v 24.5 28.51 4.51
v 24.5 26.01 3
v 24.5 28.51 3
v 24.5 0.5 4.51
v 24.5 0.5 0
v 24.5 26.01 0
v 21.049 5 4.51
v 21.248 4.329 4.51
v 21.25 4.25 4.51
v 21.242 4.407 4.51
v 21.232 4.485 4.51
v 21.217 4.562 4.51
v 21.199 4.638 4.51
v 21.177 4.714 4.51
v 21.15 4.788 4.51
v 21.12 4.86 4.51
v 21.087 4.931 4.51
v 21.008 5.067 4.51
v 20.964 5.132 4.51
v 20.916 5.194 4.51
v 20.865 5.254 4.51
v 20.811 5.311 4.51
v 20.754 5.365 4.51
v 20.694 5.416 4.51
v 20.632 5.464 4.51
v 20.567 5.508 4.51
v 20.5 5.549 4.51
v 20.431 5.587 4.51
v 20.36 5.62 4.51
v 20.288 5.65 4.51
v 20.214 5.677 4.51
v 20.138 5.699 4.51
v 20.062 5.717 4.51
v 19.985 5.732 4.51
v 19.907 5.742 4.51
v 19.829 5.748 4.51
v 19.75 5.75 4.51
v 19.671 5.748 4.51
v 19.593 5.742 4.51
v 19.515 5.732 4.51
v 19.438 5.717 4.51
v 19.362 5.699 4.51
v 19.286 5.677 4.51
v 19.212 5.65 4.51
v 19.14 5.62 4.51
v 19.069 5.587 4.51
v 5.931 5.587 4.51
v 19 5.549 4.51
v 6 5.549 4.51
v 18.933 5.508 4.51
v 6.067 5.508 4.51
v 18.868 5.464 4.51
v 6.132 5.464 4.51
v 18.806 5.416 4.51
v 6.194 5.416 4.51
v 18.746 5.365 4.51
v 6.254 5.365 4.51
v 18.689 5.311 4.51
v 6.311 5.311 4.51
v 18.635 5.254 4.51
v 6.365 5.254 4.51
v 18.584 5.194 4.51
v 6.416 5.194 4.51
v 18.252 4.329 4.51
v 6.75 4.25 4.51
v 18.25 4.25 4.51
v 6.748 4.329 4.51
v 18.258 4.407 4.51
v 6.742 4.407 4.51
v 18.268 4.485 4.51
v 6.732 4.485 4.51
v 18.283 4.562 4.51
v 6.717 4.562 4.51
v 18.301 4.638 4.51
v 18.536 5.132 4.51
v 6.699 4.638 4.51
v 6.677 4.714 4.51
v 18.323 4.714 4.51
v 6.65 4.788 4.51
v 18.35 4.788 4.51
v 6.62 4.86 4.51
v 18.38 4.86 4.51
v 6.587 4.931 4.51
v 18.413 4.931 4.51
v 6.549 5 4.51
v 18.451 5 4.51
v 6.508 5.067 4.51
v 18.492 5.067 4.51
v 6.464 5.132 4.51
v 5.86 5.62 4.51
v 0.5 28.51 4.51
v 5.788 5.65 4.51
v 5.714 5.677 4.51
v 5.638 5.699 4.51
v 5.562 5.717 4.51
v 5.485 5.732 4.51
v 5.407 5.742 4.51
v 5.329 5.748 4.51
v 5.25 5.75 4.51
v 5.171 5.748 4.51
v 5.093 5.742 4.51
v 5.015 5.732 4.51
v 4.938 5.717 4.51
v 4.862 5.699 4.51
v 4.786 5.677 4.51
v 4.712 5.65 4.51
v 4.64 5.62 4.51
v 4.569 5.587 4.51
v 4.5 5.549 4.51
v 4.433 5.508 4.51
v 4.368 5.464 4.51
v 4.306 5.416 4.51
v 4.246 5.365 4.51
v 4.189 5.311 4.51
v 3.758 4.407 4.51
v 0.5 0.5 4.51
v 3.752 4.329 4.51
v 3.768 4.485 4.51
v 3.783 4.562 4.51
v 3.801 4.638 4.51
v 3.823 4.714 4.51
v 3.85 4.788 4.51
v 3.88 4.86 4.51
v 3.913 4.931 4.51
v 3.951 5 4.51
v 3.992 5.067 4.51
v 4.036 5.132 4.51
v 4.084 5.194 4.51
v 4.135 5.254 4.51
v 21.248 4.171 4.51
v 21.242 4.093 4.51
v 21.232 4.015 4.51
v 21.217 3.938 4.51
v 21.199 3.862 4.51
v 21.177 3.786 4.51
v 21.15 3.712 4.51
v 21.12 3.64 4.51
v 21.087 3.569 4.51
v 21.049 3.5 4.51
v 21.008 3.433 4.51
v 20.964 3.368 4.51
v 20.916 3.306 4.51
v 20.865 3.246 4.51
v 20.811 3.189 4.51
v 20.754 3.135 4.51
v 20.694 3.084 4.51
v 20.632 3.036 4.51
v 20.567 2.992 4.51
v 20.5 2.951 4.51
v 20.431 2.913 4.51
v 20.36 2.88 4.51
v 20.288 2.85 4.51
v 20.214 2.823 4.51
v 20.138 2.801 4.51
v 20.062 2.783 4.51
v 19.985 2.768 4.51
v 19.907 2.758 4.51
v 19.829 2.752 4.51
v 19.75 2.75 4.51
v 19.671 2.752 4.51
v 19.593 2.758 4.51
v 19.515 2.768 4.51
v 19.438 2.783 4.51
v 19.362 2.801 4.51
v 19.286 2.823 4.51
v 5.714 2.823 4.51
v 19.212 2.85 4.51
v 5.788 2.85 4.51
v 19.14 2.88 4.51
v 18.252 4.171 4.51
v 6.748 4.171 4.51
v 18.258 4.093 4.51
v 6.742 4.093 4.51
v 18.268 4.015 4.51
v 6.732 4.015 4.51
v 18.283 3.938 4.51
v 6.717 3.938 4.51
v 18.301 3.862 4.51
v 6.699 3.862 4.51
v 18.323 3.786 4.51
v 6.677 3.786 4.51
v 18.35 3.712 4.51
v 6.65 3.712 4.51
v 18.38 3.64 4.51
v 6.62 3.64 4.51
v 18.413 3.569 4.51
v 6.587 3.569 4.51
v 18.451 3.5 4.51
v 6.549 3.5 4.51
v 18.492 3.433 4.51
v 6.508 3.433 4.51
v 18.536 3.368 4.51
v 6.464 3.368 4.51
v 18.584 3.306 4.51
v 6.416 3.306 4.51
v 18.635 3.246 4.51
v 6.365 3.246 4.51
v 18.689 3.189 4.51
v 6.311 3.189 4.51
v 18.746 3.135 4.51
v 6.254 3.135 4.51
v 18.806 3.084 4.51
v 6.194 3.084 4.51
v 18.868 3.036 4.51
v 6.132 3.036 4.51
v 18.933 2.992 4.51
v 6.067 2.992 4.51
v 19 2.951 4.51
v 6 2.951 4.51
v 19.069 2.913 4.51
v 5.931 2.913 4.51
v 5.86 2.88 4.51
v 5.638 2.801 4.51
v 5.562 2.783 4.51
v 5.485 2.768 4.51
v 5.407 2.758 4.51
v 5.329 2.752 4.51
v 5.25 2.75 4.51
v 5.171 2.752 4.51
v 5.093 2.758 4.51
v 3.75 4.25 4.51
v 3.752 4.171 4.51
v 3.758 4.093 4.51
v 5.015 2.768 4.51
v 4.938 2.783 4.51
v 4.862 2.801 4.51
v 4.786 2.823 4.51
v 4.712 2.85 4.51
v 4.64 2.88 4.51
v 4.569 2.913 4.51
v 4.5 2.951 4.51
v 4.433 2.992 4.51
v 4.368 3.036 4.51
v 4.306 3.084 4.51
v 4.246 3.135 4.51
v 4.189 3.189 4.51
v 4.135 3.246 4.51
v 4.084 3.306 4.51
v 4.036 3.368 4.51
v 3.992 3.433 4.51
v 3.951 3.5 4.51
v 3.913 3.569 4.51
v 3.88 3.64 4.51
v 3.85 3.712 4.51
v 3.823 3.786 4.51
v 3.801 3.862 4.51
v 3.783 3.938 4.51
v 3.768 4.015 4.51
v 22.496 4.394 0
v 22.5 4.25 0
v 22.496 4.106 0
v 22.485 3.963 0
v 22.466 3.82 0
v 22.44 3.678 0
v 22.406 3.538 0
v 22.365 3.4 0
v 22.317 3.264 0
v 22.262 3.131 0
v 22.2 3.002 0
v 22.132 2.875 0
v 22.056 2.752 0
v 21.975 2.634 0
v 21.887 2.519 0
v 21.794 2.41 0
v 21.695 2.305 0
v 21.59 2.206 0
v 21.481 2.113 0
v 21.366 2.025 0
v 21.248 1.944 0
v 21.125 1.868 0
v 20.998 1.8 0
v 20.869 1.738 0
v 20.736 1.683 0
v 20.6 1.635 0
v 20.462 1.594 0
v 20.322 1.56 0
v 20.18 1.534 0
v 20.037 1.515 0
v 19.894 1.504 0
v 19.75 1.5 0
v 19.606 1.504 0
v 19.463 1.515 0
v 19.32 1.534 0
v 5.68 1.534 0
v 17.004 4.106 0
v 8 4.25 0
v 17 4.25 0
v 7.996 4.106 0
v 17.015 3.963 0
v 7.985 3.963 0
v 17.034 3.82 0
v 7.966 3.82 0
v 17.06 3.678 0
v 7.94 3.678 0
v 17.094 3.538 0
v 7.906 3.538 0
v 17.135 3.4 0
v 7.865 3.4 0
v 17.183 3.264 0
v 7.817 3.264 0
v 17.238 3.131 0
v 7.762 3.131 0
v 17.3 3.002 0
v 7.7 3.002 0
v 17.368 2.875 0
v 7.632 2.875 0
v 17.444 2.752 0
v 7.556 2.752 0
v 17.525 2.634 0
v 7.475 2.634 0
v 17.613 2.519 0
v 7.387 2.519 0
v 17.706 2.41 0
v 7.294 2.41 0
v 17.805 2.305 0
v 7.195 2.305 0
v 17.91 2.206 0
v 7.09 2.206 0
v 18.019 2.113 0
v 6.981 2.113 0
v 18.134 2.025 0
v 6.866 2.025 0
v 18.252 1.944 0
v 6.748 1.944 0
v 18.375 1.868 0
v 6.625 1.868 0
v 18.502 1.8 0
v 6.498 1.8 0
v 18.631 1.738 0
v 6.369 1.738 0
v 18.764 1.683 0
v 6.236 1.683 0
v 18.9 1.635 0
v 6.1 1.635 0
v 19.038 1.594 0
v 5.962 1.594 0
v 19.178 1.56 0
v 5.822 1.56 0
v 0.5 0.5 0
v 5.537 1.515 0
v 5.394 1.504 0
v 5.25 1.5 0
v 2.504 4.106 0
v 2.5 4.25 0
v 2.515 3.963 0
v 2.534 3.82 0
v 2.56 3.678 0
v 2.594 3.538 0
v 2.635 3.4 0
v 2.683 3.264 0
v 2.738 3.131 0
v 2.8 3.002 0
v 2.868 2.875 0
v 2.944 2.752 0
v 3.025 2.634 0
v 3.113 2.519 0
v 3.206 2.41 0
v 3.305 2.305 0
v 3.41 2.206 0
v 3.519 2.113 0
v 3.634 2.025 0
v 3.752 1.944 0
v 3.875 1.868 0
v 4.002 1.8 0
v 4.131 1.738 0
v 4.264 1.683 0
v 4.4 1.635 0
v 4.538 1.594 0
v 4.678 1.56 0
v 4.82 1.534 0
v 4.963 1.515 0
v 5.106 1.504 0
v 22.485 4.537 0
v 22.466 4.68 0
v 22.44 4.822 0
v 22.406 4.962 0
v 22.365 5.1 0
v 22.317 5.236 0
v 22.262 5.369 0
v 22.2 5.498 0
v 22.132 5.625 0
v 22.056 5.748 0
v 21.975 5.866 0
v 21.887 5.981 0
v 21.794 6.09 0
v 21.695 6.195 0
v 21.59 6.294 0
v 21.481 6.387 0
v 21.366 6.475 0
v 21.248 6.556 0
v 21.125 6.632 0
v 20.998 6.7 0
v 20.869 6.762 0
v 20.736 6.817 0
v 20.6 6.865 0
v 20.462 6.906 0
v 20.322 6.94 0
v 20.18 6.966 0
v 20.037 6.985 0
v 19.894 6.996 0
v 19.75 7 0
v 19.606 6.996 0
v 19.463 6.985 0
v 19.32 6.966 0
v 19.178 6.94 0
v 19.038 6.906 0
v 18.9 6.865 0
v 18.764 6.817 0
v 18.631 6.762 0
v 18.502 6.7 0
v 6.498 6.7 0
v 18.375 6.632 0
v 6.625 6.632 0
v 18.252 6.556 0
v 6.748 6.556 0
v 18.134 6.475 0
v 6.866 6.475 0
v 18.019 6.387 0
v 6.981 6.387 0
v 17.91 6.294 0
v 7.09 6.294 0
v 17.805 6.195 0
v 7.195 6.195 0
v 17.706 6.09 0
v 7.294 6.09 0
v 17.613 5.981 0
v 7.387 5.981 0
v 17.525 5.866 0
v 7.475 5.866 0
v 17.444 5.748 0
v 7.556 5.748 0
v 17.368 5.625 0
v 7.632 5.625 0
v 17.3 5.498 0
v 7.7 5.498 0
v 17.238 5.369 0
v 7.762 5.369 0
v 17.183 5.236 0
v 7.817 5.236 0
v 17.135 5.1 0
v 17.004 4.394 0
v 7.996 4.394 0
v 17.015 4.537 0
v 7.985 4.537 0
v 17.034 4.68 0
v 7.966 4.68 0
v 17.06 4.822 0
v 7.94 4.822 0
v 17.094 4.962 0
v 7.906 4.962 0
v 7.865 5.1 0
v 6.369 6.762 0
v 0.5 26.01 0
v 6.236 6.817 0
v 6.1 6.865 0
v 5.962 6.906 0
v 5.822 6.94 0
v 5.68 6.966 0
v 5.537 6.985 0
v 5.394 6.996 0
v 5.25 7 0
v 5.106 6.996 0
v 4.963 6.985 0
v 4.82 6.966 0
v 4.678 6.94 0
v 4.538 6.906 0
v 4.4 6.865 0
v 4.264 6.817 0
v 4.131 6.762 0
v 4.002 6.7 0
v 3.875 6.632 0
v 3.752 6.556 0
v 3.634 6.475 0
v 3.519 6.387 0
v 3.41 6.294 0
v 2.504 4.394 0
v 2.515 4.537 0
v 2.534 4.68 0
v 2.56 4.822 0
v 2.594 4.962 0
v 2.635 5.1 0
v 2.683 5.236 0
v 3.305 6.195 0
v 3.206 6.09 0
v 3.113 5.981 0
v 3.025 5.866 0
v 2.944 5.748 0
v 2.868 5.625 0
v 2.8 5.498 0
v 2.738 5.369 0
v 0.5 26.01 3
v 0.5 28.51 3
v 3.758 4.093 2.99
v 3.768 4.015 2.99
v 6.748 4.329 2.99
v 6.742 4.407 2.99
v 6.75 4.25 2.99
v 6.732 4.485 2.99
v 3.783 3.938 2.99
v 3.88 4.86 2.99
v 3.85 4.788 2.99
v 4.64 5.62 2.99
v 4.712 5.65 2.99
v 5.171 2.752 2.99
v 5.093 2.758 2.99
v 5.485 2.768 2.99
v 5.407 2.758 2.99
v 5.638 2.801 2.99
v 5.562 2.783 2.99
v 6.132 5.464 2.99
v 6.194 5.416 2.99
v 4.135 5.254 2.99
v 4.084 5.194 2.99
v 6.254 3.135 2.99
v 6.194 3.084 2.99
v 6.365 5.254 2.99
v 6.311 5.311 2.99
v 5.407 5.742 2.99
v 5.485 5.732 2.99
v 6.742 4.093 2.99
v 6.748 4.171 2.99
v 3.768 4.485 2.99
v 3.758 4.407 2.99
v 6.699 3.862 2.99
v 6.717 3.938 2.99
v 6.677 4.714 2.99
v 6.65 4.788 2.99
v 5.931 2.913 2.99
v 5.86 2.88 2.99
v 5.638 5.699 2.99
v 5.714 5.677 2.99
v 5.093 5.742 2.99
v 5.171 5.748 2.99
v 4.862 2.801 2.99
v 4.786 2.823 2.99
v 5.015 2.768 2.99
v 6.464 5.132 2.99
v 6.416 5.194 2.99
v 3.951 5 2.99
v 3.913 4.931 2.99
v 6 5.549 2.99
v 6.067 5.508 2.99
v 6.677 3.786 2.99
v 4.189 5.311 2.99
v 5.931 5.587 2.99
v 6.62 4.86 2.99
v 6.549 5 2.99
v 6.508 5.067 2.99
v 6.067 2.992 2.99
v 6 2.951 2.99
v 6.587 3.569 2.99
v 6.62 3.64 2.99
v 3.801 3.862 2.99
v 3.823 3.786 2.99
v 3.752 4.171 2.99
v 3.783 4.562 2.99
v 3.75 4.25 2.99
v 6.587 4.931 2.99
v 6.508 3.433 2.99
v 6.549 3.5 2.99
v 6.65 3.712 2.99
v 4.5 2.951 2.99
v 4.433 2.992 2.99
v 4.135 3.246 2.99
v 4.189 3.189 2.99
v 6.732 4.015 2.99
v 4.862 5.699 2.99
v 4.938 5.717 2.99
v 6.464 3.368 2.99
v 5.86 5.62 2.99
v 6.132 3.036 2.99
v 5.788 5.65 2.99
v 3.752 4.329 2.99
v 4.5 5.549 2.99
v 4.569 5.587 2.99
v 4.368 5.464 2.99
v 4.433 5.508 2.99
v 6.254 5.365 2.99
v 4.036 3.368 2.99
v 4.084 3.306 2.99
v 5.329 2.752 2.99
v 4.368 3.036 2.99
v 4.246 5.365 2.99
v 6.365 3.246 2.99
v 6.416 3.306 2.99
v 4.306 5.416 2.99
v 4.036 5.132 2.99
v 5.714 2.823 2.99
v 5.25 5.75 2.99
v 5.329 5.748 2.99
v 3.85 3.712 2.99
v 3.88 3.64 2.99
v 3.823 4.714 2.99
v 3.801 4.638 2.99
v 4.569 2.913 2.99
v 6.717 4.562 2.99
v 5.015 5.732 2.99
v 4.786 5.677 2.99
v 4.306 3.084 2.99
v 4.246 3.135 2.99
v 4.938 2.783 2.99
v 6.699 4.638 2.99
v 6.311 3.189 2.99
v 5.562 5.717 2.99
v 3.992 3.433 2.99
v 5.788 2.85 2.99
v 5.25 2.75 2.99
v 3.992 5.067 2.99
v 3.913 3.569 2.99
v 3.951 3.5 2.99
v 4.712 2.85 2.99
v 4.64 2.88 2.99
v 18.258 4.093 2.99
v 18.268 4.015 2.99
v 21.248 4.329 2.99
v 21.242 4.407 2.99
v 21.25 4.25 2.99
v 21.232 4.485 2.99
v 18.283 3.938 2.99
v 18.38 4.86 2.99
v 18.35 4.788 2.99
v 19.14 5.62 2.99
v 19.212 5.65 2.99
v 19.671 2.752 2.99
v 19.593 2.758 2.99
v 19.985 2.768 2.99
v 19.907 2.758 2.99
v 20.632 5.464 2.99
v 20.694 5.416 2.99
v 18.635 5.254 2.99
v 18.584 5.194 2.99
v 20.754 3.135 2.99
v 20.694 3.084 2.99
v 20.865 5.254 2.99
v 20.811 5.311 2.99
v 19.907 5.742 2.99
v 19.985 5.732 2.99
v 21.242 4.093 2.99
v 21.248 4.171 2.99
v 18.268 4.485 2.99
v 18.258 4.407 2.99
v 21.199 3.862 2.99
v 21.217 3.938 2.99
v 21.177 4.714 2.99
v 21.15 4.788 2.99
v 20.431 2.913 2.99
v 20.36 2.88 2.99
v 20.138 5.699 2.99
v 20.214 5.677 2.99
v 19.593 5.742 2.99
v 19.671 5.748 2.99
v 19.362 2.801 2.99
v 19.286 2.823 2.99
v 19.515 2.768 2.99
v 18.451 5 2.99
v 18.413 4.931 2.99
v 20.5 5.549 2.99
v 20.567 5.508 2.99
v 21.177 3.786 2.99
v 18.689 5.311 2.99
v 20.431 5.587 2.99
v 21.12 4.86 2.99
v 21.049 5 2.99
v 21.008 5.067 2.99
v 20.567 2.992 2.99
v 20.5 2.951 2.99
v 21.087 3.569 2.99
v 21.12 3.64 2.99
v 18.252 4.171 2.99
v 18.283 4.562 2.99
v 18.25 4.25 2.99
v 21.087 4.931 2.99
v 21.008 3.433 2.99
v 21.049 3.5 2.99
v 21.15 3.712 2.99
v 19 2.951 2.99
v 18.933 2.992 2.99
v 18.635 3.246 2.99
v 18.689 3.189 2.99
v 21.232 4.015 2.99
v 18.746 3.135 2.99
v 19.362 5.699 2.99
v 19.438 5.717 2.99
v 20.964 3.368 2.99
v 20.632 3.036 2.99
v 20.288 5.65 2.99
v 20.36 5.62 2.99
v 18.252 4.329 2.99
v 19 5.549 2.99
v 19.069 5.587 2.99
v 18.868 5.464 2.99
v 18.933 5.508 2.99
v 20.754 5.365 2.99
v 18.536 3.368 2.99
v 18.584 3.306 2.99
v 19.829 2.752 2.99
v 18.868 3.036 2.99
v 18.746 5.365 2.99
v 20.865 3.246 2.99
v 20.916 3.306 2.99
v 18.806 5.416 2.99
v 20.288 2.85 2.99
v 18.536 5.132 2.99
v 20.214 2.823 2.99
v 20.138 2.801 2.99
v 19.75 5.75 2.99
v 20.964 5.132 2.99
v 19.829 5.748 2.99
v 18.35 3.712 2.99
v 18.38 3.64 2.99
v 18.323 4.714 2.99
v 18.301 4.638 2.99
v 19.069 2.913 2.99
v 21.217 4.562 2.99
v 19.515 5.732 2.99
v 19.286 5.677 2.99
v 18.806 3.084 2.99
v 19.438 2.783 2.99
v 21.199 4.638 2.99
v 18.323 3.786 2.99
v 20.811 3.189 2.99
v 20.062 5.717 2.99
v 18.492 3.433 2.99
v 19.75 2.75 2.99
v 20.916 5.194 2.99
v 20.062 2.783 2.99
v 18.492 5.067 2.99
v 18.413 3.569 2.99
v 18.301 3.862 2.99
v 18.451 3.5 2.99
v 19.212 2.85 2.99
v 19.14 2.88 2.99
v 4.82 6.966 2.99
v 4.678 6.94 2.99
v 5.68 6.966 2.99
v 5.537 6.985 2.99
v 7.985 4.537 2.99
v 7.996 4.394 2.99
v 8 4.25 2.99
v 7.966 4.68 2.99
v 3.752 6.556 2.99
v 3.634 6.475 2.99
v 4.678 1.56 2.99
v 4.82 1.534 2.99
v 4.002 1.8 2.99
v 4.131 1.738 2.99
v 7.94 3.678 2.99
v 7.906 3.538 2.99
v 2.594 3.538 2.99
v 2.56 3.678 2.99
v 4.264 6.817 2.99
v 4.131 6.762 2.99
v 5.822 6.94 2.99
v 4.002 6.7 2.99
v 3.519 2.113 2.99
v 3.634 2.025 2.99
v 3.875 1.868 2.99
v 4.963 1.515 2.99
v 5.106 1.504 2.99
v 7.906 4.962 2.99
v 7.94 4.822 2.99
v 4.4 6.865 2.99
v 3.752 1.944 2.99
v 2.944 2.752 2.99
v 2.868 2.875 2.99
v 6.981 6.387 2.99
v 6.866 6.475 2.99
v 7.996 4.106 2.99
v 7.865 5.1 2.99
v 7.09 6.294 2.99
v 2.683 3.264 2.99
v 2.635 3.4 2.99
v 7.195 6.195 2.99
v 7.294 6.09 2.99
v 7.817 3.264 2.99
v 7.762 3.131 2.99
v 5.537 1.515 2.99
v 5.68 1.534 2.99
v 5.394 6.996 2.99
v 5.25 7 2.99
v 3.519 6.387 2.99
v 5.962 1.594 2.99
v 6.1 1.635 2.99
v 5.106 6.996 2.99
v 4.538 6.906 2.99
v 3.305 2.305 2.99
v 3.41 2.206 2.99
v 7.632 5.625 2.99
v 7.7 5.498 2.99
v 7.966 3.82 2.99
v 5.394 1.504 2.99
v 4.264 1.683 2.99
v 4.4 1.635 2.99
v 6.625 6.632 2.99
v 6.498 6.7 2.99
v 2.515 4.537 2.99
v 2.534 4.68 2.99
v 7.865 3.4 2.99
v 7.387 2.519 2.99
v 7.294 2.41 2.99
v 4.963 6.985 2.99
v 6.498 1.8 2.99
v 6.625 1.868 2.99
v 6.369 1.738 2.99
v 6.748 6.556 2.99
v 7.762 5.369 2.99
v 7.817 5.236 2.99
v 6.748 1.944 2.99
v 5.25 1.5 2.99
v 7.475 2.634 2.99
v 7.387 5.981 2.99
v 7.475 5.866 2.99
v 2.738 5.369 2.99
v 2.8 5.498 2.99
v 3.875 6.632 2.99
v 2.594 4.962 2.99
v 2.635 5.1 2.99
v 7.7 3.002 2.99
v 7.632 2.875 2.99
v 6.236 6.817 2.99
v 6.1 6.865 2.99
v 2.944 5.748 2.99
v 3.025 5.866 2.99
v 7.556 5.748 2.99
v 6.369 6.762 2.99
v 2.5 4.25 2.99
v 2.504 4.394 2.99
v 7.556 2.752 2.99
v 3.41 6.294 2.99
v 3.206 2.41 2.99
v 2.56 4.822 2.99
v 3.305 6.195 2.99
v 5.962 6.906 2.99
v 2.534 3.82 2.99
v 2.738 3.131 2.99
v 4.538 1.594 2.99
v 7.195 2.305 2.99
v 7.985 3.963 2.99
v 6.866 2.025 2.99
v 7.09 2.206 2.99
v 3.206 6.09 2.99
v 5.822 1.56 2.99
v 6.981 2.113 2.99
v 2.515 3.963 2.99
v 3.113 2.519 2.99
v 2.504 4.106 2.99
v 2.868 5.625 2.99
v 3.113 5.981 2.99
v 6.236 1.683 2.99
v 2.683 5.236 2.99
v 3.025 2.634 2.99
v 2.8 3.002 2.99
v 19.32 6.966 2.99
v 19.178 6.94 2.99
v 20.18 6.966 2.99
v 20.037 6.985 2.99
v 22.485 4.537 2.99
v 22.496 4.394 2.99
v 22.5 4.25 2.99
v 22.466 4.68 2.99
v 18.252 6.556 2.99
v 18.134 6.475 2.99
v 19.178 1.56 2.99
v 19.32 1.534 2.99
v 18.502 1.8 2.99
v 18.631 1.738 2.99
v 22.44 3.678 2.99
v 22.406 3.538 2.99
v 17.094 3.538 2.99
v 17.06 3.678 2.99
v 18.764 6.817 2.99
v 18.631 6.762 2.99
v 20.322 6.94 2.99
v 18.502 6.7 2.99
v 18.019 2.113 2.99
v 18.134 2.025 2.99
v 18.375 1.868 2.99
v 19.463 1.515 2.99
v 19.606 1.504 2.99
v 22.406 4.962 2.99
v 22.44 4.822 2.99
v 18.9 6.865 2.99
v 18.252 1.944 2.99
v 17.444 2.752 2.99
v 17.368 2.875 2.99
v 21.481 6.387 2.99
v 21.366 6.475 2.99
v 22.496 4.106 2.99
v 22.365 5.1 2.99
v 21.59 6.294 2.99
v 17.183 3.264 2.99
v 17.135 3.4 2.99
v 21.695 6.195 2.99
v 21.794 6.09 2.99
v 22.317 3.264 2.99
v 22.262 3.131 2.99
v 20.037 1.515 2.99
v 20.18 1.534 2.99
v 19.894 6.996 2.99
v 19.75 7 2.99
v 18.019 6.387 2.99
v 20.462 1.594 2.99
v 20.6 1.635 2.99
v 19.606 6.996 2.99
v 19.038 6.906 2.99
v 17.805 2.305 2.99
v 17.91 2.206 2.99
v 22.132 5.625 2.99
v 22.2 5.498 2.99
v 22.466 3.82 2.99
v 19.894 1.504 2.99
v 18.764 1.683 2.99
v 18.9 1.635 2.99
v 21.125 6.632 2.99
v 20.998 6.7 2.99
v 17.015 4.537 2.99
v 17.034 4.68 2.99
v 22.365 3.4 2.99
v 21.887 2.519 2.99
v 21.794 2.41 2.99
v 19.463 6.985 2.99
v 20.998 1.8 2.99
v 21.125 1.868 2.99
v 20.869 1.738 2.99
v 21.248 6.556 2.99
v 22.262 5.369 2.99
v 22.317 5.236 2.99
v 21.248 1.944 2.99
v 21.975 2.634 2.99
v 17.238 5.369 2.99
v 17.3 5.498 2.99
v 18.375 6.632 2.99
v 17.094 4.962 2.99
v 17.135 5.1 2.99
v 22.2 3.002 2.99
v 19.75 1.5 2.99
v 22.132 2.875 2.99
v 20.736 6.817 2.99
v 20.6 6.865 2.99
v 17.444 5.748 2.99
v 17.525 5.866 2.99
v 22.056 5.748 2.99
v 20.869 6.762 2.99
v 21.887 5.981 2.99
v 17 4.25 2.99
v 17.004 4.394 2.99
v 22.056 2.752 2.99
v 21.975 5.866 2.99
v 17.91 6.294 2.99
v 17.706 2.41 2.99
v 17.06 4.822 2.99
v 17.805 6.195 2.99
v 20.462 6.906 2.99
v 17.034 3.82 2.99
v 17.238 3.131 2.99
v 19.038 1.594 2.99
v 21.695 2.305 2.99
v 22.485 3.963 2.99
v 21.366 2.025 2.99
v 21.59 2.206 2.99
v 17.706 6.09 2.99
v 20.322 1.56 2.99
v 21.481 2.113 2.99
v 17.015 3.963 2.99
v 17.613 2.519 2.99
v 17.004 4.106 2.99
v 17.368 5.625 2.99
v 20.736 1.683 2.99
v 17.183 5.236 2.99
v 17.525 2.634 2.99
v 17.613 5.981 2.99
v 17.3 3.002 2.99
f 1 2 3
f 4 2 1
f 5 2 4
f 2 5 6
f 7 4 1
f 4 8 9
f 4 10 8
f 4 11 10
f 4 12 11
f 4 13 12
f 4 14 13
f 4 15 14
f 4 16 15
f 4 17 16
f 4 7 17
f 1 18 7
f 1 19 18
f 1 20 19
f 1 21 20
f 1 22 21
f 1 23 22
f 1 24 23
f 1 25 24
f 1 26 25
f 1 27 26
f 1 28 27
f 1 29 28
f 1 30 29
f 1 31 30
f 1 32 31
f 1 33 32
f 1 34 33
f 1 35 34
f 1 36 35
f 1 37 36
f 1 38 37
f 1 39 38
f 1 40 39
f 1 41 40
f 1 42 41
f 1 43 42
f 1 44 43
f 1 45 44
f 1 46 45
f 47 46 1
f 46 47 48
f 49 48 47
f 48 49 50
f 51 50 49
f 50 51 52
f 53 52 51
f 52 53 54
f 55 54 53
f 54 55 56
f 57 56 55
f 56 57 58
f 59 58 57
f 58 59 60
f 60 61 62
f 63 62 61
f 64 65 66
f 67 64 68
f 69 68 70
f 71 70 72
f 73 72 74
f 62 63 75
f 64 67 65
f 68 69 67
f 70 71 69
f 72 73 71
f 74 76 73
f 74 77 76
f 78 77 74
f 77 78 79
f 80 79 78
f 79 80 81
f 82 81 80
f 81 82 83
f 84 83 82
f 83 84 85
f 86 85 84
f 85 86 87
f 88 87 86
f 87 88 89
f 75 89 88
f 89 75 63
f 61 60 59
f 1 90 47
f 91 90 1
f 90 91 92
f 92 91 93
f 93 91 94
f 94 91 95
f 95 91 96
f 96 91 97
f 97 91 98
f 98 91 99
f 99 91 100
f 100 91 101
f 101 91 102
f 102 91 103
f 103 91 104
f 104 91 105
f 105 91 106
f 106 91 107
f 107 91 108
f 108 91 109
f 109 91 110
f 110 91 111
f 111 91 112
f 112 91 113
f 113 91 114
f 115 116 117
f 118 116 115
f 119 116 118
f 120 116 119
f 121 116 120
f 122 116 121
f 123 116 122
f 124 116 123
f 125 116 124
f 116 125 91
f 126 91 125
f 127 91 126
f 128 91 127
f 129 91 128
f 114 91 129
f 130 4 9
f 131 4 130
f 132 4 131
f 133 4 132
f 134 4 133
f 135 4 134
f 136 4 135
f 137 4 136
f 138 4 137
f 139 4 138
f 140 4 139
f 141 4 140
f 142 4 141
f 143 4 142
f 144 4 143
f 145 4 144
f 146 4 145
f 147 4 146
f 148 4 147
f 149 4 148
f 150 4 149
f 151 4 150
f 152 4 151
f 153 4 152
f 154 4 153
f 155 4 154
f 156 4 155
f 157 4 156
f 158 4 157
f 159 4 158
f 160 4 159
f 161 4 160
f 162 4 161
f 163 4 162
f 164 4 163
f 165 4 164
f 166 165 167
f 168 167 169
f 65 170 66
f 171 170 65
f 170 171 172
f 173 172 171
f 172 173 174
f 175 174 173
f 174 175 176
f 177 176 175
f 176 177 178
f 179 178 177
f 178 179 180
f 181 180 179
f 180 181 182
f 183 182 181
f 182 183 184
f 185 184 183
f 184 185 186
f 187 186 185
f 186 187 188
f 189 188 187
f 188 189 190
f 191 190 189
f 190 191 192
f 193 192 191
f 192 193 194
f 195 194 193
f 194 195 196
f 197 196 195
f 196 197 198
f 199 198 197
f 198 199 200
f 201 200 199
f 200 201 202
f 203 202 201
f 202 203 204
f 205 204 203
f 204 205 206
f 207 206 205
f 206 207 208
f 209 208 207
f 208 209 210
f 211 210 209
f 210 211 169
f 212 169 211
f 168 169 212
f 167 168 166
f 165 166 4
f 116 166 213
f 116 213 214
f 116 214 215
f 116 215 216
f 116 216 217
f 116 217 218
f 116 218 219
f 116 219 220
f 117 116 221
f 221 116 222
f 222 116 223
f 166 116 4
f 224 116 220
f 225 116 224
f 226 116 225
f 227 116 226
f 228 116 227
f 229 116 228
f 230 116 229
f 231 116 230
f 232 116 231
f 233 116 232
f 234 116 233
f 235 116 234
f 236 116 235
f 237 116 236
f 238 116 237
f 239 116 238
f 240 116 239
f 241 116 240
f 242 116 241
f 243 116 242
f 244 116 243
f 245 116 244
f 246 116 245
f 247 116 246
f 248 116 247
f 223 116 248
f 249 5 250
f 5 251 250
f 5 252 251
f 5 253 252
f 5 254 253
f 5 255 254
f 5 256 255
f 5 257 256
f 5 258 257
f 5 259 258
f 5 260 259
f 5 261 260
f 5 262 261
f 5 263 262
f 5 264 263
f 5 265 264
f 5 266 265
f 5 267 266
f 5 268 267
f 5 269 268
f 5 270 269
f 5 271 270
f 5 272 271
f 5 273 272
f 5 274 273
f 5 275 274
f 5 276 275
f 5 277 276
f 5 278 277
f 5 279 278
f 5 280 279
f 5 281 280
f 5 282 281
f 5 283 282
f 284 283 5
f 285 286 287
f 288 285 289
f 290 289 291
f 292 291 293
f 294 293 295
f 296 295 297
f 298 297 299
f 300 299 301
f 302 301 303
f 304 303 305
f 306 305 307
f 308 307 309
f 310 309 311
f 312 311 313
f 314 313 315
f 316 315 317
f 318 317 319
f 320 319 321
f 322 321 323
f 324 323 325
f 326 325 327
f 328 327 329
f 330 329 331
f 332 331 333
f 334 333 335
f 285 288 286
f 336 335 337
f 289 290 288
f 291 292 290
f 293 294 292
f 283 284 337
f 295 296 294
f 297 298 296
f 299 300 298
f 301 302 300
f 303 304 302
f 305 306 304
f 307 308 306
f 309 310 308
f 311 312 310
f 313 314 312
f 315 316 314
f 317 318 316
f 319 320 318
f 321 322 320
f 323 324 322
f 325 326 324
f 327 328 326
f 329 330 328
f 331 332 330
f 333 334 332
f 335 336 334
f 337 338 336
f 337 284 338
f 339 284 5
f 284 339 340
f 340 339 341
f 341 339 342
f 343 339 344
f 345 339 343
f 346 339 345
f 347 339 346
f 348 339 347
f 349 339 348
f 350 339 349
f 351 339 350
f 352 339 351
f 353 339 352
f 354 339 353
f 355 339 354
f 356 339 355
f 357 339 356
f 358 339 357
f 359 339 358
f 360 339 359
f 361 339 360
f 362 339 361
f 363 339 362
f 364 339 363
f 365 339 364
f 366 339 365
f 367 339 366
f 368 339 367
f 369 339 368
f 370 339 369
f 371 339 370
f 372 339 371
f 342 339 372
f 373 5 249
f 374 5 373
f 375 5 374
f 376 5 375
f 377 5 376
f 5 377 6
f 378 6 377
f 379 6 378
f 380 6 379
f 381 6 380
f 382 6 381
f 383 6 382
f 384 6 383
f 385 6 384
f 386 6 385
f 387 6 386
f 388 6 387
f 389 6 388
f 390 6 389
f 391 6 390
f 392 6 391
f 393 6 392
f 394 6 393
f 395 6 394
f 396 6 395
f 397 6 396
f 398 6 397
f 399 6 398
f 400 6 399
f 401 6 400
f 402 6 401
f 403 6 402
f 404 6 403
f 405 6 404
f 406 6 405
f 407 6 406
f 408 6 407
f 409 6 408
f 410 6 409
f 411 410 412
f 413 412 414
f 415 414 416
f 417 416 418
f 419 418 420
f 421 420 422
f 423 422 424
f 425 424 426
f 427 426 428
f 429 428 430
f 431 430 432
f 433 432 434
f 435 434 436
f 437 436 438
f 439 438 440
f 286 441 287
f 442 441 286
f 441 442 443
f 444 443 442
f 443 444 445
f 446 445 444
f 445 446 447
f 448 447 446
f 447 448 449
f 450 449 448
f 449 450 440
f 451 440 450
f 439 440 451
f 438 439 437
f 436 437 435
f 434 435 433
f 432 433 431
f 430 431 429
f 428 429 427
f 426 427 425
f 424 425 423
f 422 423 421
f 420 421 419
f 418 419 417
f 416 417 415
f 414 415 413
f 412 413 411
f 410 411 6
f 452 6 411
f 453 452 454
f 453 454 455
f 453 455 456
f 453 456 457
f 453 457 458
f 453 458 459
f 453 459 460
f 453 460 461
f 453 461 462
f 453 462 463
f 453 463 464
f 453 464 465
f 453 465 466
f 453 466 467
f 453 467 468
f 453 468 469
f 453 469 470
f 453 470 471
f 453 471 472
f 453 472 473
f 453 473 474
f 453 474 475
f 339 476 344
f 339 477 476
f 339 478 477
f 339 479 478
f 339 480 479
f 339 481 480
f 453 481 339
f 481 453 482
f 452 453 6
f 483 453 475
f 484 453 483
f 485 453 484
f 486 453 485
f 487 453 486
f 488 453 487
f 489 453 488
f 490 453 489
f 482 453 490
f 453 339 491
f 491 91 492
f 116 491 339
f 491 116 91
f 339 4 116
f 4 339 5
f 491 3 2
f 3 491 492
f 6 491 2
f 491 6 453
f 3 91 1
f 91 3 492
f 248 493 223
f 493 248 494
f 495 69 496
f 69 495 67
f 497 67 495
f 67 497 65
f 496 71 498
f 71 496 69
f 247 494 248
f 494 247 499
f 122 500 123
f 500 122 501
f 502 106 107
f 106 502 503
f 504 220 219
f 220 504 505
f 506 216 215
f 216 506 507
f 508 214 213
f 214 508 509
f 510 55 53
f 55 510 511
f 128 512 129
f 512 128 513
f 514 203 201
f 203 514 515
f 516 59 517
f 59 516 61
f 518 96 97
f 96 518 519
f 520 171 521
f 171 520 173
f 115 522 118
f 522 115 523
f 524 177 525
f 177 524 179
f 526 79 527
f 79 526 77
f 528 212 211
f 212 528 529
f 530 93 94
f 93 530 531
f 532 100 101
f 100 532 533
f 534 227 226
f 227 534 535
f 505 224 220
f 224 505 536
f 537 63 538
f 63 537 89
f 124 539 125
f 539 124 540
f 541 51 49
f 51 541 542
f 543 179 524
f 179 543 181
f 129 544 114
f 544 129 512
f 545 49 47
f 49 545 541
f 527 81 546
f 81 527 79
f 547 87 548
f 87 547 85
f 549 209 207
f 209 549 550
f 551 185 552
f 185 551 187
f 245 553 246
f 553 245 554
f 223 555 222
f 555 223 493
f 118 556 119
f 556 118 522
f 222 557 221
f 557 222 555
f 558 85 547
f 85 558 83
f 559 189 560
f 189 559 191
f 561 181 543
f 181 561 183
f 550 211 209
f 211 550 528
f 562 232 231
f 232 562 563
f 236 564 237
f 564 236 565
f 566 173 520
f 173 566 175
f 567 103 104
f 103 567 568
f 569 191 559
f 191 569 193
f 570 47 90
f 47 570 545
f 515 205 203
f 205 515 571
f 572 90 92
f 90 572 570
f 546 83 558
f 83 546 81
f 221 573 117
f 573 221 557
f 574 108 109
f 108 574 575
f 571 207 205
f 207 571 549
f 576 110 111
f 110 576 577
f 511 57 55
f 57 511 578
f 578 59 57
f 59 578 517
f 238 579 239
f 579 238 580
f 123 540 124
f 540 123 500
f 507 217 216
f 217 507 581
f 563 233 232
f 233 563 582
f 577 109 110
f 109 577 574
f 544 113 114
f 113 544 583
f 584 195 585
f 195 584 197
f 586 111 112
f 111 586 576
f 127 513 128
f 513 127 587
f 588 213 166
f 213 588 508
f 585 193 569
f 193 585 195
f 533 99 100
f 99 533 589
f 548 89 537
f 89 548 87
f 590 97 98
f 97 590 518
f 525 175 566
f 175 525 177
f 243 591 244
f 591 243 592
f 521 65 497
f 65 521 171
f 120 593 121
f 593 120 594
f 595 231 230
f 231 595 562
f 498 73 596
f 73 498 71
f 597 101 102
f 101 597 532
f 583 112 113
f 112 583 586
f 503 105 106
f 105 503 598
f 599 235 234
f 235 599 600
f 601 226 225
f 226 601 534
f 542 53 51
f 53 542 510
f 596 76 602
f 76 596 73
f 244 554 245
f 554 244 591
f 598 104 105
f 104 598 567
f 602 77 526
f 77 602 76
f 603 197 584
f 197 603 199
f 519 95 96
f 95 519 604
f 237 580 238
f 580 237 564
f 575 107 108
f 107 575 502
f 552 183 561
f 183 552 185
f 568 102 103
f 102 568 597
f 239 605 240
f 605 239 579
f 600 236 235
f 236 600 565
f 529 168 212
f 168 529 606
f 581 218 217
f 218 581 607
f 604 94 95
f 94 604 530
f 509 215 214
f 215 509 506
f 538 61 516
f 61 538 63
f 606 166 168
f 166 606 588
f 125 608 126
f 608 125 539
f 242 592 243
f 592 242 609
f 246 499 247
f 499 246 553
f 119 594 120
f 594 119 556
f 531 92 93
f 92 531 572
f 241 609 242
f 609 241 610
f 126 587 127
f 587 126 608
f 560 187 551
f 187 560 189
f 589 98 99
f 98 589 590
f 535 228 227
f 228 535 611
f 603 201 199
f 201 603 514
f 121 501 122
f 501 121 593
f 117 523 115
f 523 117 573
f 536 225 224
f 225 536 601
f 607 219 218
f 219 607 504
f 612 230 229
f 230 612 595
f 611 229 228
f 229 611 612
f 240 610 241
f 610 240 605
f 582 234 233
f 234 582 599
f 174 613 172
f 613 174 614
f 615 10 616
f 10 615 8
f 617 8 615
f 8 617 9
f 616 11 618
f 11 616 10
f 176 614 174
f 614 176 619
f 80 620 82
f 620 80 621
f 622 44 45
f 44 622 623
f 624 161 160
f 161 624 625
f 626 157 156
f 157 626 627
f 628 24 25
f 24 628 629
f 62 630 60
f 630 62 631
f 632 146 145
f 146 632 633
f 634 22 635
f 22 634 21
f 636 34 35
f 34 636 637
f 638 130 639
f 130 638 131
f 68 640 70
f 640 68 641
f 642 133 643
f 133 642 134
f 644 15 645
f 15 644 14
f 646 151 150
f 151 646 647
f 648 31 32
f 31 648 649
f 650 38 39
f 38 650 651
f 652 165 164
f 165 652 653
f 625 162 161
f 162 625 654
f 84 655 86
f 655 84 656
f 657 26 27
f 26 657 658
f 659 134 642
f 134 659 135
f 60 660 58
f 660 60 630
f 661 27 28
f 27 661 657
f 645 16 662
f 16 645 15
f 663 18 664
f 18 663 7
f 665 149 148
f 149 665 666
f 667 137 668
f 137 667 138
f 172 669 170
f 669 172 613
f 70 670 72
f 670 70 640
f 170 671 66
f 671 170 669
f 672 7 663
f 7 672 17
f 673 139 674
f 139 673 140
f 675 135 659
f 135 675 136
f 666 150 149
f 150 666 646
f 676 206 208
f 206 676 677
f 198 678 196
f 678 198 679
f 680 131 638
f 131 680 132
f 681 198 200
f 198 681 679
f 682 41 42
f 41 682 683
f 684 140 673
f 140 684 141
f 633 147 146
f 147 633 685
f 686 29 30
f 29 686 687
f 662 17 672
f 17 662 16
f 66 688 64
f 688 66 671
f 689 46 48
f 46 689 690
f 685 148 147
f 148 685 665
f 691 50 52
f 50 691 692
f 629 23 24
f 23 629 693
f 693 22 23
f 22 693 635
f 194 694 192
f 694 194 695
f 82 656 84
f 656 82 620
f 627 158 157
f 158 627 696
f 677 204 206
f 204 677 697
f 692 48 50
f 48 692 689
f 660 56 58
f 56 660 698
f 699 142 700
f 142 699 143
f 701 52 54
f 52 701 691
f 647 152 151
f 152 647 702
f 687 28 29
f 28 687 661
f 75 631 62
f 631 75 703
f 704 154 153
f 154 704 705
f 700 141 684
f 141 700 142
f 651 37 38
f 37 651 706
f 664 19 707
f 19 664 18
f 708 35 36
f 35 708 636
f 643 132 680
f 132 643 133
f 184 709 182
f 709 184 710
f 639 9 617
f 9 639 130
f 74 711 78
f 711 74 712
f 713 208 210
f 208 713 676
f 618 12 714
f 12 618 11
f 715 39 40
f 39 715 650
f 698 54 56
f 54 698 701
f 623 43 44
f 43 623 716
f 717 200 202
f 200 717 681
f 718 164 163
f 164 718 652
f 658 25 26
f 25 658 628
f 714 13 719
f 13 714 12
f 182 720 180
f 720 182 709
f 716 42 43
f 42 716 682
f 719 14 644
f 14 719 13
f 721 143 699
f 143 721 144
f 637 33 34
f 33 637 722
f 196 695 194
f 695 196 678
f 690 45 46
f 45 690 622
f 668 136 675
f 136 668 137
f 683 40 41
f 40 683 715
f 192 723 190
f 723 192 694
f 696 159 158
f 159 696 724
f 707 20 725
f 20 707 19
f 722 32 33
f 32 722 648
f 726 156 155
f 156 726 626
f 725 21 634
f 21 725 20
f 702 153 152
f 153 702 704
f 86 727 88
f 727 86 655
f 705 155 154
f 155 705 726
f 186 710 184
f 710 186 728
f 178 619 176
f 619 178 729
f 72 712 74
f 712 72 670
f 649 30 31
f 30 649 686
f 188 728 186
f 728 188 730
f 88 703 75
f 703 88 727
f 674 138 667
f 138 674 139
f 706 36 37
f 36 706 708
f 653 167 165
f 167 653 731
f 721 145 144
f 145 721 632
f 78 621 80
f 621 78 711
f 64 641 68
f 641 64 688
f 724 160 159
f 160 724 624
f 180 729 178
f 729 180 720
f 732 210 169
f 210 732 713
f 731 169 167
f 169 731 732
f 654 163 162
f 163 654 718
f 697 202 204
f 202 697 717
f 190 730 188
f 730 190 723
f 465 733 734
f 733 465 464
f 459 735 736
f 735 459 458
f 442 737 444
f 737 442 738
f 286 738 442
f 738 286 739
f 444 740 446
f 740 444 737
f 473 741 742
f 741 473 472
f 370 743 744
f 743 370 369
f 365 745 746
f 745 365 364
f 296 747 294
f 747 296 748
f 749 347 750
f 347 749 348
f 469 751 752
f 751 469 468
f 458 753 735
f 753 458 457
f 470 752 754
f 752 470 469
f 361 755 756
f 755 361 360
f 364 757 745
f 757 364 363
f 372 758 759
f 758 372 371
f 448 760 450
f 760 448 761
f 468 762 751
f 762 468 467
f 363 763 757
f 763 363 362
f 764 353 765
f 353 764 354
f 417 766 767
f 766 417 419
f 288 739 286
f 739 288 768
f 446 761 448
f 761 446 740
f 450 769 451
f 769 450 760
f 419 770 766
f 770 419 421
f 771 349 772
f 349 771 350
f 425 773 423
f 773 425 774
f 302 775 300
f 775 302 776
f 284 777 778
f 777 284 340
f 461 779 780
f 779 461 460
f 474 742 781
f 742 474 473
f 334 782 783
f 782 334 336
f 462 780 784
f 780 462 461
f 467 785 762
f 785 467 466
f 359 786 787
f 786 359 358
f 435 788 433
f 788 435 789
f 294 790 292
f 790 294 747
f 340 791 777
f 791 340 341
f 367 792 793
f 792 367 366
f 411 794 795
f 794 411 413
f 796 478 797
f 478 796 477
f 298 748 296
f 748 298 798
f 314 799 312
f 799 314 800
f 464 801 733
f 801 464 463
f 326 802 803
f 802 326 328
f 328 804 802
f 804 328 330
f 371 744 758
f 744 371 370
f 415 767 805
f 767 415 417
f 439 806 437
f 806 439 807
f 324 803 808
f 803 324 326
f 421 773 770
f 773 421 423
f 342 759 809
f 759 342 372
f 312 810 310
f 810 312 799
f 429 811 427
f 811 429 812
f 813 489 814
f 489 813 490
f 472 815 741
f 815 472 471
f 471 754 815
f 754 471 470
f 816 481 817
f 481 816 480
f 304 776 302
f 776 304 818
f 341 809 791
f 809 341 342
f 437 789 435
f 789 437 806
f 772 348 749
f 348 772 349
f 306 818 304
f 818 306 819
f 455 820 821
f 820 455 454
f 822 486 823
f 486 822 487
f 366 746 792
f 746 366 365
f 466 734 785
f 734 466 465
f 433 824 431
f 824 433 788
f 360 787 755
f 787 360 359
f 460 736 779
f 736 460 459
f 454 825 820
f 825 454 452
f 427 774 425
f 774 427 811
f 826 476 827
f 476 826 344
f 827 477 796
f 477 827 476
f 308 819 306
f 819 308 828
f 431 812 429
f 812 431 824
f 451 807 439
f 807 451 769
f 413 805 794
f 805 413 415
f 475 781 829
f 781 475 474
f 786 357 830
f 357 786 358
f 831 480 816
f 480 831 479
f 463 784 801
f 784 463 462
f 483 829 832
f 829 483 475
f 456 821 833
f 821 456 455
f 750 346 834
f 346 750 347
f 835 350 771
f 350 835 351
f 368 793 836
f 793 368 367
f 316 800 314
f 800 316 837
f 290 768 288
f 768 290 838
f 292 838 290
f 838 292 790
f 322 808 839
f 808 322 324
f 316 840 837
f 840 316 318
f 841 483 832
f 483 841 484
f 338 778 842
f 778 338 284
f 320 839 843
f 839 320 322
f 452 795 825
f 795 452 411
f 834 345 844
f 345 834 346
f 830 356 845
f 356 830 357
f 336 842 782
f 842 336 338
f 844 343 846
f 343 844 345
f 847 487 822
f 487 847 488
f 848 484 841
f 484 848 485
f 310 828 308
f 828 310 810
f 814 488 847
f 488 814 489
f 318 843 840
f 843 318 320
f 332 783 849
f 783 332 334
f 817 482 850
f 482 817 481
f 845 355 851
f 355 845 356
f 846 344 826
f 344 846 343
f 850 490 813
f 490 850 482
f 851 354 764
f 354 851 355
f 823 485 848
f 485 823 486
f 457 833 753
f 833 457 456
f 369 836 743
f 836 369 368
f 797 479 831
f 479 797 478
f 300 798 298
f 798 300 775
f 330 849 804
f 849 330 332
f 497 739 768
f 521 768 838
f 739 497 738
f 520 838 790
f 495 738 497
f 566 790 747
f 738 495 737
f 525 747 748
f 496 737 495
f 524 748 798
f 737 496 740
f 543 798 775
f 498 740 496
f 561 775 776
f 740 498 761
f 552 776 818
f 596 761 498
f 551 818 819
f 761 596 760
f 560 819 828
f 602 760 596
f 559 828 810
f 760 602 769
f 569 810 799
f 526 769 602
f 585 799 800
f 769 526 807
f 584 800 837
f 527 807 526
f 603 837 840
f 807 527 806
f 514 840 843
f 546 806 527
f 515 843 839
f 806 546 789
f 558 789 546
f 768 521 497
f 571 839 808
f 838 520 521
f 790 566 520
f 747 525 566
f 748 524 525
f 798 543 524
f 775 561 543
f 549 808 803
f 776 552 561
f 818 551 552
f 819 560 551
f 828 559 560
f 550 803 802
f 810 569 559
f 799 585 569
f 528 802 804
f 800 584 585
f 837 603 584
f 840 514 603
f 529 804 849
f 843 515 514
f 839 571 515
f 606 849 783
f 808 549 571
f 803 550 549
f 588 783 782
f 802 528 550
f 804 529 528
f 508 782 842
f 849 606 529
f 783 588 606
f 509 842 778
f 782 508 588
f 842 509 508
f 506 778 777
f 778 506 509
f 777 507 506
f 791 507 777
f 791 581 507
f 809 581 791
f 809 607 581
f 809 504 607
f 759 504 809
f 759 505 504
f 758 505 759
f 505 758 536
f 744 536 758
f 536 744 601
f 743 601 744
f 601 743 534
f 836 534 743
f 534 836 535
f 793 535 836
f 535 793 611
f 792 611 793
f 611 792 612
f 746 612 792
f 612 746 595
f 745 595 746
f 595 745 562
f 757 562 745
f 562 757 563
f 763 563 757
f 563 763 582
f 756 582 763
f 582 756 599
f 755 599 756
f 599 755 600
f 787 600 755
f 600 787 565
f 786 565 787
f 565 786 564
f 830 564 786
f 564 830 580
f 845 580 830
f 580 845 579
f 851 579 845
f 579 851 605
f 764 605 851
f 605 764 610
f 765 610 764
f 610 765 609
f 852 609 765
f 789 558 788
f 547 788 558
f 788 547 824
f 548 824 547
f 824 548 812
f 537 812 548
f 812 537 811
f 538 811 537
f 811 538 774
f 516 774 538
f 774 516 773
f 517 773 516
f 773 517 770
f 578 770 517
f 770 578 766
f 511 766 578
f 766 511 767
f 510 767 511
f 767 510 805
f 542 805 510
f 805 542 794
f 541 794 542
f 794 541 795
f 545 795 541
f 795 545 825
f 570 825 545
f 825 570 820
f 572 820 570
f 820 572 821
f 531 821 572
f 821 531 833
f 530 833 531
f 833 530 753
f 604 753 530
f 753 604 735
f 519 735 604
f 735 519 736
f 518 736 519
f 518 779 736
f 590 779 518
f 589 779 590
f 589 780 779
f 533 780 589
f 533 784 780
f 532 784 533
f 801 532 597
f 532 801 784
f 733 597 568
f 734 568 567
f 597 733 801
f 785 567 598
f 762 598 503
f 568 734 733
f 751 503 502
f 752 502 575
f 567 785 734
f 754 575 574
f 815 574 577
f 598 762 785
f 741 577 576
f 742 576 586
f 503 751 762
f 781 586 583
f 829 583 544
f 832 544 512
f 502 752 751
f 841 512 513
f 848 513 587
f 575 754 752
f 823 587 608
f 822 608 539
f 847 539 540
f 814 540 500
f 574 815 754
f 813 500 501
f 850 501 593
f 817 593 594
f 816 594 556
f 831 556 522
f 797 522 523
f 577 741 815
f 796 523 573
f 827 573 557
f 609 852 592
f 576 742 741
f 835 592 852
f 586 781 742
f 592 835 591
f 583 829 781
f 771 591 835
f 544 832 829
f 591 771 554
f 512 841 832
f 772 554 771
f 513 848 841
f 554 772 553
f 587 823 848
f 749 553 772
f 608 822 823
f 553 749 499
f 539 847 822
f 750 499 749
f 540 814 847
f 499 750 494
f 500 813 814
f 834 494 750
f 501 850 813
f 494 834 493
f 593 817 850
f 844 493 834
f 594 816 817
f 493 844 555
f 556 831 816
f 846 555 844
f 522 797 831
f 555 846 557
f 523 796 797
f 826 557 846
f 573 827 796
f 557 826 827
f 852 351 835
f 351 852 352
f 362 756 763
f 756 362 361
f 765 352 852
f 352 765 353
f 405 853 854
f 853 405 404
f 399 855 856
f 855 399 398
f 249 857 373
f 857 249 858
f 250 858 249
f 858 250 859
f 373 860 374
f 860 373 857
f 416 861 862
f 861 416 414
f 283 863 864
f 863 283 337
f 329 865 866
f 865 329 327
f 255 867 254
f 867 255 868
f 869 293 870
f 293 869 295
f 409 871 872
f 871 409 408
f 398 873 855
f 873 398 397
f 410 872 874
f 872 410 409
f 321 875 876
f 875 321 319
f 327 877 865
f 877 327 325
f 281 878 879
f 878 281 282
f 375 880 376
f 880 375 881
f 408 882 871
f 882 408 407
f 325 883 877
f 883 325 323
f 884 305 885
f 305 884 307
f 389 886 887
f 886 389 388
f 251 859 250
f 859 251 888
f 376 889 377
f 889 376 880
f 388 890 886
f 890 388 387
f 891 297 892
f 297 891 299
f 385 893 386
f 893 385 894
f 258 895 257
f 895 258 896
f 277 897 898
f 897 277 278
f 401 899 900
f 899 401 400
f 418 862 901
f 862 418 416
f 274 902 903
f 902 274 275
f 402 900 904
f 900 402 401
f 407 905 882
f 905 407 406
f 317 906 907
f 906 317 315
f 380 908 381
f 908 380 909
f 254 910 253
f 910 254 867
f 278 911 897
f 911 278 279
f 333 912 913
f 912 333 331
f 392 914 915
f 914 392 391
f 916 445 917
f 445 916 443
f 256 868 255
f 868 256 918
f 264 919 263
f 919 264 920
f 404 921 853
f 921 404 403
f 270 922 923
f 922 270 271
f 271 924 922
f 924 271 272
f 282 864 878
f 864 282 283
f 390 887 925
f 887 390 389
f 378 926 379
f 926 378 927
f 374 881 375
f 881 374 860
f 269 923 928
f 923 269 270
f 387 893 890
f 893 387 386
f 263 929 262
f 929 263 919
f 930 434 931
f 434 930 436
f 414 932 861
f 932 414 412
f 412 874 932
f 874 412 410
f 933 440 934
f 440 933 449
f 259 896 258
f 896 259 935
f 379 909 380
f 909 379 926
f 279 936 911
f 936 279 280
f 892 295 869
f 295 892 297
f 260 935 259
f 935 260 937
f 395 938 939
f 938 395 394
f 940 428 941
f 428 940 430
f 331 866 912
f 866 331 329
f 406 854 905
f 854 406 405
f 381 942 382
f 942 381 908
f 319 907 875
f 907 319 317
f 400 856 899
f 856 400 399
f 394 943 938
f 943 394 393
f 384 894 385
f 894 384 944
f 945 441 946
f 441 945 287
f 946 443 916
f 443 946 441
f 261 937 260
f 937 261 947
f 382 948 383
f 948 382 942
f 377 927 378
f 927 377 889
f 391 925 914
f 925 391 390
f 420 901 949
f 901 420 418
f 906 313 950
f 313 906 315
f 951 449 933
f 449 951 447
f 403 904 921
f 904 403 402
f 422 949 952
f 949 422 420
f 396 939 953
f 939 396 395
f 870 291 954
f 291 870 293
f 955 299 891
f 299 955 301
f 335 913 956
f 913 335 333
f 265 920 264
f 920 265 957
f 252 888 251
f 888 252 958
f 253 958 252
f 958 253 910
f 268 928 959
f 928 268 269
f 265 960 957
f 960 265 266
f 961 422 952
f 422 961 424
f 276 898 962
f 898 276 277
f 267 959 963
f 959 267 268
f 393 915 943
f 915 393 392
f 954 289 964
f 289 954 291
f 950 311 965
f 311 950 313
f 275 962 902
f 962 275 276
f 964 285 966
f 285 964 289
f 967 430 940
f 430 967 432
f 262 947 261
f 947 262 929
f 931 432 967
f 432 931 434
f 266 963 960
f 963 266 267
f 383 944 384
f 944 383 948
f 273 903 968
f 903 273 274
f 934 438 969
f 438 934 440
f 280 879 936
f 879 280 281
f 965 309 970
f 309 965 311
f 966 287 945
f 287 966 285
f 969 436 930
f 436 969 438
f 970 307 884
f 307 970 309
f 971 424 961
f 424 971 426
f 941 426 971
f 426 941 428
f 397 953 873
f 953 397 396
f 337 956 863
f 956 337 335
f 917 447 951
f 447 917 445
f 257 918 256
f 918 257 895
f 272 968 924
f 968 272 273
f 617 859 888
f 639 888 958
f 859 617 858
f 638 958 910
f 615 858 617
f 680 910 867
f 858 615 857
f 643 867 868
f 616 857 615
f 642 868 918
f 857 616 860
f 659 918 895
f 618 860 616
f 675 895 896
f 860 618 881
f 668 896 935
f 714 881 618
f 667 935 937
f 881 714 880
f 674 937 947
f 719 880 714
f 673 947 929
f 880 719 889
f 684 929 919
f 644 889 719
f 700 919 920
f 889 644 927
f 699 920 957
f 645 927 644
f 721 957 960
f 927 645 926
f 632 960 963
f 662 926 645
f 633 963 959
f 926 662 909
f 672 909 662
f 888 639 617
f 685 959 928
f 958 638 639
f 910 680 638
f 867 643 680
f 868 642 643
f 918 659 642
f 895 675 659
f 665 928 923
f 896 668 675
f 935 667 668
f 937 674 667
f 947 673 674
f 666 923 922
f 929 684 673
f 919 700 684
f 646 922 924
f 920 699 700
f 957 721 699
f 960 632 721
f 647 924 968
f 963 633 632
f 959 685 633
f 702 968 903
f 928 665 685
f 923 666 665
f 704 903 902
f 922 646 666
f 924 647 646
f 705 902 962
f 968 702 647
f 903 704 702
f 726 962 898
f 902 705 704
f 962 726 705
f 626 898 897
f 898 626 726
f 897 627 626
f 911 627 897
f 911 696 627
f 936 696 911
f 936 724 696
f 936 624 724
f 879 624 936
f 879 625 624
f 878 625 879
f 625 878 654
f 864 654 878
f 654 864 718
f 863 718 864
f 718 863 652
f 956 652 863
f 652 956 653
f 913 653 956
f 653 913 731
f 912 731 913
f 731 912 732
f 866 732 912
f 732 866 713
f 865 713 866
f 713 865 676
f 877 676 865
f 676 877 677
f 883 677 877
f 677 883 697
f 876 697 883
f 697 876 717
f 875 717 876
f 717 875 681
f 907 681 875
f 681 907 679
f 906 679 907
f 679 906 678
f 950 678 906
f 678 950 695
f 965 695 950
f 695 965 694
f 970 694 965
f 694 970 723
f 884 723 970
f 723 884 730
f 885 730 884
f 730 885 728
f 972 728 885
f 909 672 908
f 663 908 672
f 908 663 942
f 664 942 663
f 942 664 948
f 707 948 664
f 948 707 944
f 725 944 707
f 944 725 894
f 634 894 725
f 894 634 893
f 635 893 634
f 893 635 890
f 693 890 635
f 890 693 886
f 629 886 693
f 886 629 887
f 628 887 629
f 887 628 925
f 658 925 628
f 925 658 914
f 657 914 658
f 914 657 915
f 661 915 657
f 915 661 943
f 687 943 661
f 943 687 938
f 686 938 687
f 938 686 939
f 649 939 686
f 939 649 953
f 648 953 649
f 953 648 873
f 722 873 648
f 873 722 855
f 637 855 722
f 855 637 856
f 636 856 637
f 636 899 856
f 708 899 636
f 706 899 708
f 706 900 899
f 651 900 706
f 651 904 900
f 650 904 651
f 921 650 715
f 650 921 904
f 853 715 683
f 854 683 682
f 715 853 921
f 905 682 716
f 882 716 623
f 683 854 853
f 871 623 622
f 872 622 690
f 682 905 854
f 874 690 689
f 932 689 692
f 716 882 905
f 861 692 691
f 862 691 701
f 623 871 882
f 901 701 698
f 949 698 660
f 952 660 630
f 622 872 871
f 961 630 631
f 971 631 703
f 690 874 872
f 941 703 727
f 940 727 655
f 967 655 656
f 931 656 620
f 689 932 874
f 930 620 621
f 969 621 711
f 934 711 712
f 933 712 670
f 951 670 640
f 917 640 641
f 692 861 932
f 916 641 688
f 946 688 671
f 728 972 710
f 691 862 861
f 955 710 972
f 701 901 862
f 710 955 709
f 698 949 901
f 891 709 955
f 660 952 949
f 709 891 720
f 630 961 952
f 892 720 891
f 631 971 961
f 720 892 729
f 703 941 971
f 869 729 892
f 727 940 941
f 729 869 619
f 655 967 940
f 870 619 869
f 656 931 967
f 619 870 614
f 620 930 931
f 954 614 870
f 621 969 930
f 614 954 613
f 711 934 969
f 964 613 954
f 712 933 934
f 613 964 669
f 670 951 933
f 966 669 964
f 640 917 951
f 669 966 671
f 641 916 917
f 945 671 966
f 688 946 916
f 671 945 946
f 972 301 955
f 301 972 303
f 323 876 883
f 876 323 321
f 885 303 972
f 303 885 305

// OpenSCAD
// file: nuke-base.scad
eps = 0.01;
z_max = 22;
//$fn = 90;
tol = 0.5;

// M3 bolt parameters
// bold diameter
m3_bd = 3;
// bold height
m3_bh = 18;
// nut diameter
m3_nd = 6.5;
// nut height
m3_nh = 2.5;
// bolt head diameter
m3_bhd = 5.5;
// bolt head height
m3_bht = 2;

// bulb holder parameters
bh_d = 24;
bh_h = 15;

// bulb holder cable diameters
bhc_d = 6;
bhc_l = 10;
bhc_h = 18;
bhn_l = 17.5;
bhn_d = m3_bd; 

// chocolate hole
chc_x = 14;
chc_y = 18.5;
chn_x = 25;
chn_y = 12;
chs = 8;
ch_z = 6;

module bulb_holder()
{
    // bulb holder 
    translate([0,0,bhc_h-eps]) cylinder(d=bh_d, h=bh_h);
    
    // hole for the cable
    hull()
    {
        translate([-bhc_l/2,0,0]) cylinder(h=bhc_h,d=bhc_d);
        translate([bhc_l/2,0,0]) cylinder(h=bhc_h,d=bhc_d);
    }
    
    // holes for screws
    translate([0,-bhn_l/2,0]) cylinder(h=bhc_h, d= bhn_d);
    translate([0,bhn_l/2,0]) cylinder(h=bhc_h, d= bhn_d);
    
    // holes for nuts
    nh_l = bhc_h - m3_bh/2+m3_nh+m3_bht;
    translate([0,-bhn_l/2,0]) cylinder(h=nh_l, d=m3_nd, $fn=6);
    translate([0,bhn_l/2,0]) cylinder(h=nh_l, d=m3_nd, $fn=6);
    
}
//bulb_holder();

module chocolate_hole(t=5)
{
    dx = (chn_x-chc_x)/2;
    dy = (chc_y-chn_y)/2;
    translate([dx,chs,t]) cube([chc_x,chc_y,ch_z]);
    translate([0,dy+chs,t]) cube([chn_x,chn_y,ch_z]);
    
    // holes for cables
    hdx = (chn_x-chs)/2;
    translate([hdx,0,t]) cube([chs,chs,ch_z]);
    translate([hdx,chs+chc_y,t]) cube([chs,chs,ch_z]);
    
    // lower part
    difference()
    {
        cube([chn_x,chc_y+2*chs, t+tol+eps]);
        translate([-eps,chc_y+chs+eps,-eps])
            cube([chn_x+tol,chs,t/2+tol+eps]);
    }
    
    // bolt holes
    ch_y = chn_x;
    bh_dy = (((ch_y-chs)/2)-m3_bd)/2+m3_bd/2;
    _off = 1;
    //translate([bh_dy,bh_dy,-eps]) cylinder(d=m3_bhd,h=m3_bht+tol);
    translate([bh_dy+_off,bh_dy,-eps]) cylinder(d=m3_bd,h=m3_bh+tol);
    translate([ch_y-bh_dy-_off,bh_dy,-eps]) cylinder(d=m3_bd,h=m3_bh+tol);
    
    // nut holes
    n_o = m3_bh-m3_nh-tol;
    translate([bh_dy+_off,bh_dy,n_o+eps]) rotate([0,0,90])
        cylinder($fn=6, d=m3_nd, h= m3_nh+2*tol);
    translate([ch_y-bh_dy-_off,bh_dy,n_o+eps]) rotate([0,0,90])
        cylinder($fn=6, d=m3_nd, h= m3_nh+2*tol);
    
}

//chocolate_hole();

module chocolate_cover(t=4)
{
    difference()
    {
        translate([tol, tol, 0])
            cube([chn_x-2*tol,chc_y+2*chs-2*tol, t+tol+eps]);
        // back holding
        translate([-eps,chc_y+chs+eps-tol,-eps])
            cube([chn_x+tol,chs+tol,t/2+2*tol+eps]);
        // back holding cut
        translate([-eps, chc_y+1.25*chs+eps, -eps])
            cube([chn_x+tol, chs, tol+t+3*eps]);
        
        // bolt holes
        ch_y = chn_x;
        bh_dy = (((ch_y-chs)/2)-m3_bd)/2+m3_bd/2;
        _off = 1;
        //translate([bh_dy,bh_dy,-eps]) cylinder(d=m3_bhd,h=m3_bht+tol);
        translate([bh_dy+_off,bh_dy,-eps])
            cylinder(d=m3_bd,h=m3_bh+tol);
        translate([ch_y-bh_dy-_off,bh_dy,-eps])
            cylinder(d=m3_bd,h=m3_bh+tol);
        
        // bold head holes
        translate([bh_dy+_off,bh_dy,-eps])
            cylinder(d=m3_bhd,h=m3_bht+2*tol);
        translate([ch_y-bh_dy-_off,bh_dy,-eps])
            cylinder(d=m3_bhd,h=m3_bht+2*tol);
    }    
}

//chocolate_cover();

module lamp_post()
{    
    render(10)
    difference()
    {
        translate([0,0,0.2]) import("import/nuke_base.stl");
        rotate([0,0,90]) bulb_holder();
        chx = chn_x/2;
        chy = -bhc_l/2+2;
        translate([chx,chy+1.5,-eps]) rotate([0,0,180])
            chocolate_hole();
    }
}

//lamp_post();
// main file
use<nuke-base.scad>

part_name = "cover"; // ["cover", "lamp-post"]

$fn = $preview ? 36 : 120;


if (part_name == "cover")
{
    chocolate_cover();
}
else if (part_name == "lamp-post")
{
    lamp_post();
}
